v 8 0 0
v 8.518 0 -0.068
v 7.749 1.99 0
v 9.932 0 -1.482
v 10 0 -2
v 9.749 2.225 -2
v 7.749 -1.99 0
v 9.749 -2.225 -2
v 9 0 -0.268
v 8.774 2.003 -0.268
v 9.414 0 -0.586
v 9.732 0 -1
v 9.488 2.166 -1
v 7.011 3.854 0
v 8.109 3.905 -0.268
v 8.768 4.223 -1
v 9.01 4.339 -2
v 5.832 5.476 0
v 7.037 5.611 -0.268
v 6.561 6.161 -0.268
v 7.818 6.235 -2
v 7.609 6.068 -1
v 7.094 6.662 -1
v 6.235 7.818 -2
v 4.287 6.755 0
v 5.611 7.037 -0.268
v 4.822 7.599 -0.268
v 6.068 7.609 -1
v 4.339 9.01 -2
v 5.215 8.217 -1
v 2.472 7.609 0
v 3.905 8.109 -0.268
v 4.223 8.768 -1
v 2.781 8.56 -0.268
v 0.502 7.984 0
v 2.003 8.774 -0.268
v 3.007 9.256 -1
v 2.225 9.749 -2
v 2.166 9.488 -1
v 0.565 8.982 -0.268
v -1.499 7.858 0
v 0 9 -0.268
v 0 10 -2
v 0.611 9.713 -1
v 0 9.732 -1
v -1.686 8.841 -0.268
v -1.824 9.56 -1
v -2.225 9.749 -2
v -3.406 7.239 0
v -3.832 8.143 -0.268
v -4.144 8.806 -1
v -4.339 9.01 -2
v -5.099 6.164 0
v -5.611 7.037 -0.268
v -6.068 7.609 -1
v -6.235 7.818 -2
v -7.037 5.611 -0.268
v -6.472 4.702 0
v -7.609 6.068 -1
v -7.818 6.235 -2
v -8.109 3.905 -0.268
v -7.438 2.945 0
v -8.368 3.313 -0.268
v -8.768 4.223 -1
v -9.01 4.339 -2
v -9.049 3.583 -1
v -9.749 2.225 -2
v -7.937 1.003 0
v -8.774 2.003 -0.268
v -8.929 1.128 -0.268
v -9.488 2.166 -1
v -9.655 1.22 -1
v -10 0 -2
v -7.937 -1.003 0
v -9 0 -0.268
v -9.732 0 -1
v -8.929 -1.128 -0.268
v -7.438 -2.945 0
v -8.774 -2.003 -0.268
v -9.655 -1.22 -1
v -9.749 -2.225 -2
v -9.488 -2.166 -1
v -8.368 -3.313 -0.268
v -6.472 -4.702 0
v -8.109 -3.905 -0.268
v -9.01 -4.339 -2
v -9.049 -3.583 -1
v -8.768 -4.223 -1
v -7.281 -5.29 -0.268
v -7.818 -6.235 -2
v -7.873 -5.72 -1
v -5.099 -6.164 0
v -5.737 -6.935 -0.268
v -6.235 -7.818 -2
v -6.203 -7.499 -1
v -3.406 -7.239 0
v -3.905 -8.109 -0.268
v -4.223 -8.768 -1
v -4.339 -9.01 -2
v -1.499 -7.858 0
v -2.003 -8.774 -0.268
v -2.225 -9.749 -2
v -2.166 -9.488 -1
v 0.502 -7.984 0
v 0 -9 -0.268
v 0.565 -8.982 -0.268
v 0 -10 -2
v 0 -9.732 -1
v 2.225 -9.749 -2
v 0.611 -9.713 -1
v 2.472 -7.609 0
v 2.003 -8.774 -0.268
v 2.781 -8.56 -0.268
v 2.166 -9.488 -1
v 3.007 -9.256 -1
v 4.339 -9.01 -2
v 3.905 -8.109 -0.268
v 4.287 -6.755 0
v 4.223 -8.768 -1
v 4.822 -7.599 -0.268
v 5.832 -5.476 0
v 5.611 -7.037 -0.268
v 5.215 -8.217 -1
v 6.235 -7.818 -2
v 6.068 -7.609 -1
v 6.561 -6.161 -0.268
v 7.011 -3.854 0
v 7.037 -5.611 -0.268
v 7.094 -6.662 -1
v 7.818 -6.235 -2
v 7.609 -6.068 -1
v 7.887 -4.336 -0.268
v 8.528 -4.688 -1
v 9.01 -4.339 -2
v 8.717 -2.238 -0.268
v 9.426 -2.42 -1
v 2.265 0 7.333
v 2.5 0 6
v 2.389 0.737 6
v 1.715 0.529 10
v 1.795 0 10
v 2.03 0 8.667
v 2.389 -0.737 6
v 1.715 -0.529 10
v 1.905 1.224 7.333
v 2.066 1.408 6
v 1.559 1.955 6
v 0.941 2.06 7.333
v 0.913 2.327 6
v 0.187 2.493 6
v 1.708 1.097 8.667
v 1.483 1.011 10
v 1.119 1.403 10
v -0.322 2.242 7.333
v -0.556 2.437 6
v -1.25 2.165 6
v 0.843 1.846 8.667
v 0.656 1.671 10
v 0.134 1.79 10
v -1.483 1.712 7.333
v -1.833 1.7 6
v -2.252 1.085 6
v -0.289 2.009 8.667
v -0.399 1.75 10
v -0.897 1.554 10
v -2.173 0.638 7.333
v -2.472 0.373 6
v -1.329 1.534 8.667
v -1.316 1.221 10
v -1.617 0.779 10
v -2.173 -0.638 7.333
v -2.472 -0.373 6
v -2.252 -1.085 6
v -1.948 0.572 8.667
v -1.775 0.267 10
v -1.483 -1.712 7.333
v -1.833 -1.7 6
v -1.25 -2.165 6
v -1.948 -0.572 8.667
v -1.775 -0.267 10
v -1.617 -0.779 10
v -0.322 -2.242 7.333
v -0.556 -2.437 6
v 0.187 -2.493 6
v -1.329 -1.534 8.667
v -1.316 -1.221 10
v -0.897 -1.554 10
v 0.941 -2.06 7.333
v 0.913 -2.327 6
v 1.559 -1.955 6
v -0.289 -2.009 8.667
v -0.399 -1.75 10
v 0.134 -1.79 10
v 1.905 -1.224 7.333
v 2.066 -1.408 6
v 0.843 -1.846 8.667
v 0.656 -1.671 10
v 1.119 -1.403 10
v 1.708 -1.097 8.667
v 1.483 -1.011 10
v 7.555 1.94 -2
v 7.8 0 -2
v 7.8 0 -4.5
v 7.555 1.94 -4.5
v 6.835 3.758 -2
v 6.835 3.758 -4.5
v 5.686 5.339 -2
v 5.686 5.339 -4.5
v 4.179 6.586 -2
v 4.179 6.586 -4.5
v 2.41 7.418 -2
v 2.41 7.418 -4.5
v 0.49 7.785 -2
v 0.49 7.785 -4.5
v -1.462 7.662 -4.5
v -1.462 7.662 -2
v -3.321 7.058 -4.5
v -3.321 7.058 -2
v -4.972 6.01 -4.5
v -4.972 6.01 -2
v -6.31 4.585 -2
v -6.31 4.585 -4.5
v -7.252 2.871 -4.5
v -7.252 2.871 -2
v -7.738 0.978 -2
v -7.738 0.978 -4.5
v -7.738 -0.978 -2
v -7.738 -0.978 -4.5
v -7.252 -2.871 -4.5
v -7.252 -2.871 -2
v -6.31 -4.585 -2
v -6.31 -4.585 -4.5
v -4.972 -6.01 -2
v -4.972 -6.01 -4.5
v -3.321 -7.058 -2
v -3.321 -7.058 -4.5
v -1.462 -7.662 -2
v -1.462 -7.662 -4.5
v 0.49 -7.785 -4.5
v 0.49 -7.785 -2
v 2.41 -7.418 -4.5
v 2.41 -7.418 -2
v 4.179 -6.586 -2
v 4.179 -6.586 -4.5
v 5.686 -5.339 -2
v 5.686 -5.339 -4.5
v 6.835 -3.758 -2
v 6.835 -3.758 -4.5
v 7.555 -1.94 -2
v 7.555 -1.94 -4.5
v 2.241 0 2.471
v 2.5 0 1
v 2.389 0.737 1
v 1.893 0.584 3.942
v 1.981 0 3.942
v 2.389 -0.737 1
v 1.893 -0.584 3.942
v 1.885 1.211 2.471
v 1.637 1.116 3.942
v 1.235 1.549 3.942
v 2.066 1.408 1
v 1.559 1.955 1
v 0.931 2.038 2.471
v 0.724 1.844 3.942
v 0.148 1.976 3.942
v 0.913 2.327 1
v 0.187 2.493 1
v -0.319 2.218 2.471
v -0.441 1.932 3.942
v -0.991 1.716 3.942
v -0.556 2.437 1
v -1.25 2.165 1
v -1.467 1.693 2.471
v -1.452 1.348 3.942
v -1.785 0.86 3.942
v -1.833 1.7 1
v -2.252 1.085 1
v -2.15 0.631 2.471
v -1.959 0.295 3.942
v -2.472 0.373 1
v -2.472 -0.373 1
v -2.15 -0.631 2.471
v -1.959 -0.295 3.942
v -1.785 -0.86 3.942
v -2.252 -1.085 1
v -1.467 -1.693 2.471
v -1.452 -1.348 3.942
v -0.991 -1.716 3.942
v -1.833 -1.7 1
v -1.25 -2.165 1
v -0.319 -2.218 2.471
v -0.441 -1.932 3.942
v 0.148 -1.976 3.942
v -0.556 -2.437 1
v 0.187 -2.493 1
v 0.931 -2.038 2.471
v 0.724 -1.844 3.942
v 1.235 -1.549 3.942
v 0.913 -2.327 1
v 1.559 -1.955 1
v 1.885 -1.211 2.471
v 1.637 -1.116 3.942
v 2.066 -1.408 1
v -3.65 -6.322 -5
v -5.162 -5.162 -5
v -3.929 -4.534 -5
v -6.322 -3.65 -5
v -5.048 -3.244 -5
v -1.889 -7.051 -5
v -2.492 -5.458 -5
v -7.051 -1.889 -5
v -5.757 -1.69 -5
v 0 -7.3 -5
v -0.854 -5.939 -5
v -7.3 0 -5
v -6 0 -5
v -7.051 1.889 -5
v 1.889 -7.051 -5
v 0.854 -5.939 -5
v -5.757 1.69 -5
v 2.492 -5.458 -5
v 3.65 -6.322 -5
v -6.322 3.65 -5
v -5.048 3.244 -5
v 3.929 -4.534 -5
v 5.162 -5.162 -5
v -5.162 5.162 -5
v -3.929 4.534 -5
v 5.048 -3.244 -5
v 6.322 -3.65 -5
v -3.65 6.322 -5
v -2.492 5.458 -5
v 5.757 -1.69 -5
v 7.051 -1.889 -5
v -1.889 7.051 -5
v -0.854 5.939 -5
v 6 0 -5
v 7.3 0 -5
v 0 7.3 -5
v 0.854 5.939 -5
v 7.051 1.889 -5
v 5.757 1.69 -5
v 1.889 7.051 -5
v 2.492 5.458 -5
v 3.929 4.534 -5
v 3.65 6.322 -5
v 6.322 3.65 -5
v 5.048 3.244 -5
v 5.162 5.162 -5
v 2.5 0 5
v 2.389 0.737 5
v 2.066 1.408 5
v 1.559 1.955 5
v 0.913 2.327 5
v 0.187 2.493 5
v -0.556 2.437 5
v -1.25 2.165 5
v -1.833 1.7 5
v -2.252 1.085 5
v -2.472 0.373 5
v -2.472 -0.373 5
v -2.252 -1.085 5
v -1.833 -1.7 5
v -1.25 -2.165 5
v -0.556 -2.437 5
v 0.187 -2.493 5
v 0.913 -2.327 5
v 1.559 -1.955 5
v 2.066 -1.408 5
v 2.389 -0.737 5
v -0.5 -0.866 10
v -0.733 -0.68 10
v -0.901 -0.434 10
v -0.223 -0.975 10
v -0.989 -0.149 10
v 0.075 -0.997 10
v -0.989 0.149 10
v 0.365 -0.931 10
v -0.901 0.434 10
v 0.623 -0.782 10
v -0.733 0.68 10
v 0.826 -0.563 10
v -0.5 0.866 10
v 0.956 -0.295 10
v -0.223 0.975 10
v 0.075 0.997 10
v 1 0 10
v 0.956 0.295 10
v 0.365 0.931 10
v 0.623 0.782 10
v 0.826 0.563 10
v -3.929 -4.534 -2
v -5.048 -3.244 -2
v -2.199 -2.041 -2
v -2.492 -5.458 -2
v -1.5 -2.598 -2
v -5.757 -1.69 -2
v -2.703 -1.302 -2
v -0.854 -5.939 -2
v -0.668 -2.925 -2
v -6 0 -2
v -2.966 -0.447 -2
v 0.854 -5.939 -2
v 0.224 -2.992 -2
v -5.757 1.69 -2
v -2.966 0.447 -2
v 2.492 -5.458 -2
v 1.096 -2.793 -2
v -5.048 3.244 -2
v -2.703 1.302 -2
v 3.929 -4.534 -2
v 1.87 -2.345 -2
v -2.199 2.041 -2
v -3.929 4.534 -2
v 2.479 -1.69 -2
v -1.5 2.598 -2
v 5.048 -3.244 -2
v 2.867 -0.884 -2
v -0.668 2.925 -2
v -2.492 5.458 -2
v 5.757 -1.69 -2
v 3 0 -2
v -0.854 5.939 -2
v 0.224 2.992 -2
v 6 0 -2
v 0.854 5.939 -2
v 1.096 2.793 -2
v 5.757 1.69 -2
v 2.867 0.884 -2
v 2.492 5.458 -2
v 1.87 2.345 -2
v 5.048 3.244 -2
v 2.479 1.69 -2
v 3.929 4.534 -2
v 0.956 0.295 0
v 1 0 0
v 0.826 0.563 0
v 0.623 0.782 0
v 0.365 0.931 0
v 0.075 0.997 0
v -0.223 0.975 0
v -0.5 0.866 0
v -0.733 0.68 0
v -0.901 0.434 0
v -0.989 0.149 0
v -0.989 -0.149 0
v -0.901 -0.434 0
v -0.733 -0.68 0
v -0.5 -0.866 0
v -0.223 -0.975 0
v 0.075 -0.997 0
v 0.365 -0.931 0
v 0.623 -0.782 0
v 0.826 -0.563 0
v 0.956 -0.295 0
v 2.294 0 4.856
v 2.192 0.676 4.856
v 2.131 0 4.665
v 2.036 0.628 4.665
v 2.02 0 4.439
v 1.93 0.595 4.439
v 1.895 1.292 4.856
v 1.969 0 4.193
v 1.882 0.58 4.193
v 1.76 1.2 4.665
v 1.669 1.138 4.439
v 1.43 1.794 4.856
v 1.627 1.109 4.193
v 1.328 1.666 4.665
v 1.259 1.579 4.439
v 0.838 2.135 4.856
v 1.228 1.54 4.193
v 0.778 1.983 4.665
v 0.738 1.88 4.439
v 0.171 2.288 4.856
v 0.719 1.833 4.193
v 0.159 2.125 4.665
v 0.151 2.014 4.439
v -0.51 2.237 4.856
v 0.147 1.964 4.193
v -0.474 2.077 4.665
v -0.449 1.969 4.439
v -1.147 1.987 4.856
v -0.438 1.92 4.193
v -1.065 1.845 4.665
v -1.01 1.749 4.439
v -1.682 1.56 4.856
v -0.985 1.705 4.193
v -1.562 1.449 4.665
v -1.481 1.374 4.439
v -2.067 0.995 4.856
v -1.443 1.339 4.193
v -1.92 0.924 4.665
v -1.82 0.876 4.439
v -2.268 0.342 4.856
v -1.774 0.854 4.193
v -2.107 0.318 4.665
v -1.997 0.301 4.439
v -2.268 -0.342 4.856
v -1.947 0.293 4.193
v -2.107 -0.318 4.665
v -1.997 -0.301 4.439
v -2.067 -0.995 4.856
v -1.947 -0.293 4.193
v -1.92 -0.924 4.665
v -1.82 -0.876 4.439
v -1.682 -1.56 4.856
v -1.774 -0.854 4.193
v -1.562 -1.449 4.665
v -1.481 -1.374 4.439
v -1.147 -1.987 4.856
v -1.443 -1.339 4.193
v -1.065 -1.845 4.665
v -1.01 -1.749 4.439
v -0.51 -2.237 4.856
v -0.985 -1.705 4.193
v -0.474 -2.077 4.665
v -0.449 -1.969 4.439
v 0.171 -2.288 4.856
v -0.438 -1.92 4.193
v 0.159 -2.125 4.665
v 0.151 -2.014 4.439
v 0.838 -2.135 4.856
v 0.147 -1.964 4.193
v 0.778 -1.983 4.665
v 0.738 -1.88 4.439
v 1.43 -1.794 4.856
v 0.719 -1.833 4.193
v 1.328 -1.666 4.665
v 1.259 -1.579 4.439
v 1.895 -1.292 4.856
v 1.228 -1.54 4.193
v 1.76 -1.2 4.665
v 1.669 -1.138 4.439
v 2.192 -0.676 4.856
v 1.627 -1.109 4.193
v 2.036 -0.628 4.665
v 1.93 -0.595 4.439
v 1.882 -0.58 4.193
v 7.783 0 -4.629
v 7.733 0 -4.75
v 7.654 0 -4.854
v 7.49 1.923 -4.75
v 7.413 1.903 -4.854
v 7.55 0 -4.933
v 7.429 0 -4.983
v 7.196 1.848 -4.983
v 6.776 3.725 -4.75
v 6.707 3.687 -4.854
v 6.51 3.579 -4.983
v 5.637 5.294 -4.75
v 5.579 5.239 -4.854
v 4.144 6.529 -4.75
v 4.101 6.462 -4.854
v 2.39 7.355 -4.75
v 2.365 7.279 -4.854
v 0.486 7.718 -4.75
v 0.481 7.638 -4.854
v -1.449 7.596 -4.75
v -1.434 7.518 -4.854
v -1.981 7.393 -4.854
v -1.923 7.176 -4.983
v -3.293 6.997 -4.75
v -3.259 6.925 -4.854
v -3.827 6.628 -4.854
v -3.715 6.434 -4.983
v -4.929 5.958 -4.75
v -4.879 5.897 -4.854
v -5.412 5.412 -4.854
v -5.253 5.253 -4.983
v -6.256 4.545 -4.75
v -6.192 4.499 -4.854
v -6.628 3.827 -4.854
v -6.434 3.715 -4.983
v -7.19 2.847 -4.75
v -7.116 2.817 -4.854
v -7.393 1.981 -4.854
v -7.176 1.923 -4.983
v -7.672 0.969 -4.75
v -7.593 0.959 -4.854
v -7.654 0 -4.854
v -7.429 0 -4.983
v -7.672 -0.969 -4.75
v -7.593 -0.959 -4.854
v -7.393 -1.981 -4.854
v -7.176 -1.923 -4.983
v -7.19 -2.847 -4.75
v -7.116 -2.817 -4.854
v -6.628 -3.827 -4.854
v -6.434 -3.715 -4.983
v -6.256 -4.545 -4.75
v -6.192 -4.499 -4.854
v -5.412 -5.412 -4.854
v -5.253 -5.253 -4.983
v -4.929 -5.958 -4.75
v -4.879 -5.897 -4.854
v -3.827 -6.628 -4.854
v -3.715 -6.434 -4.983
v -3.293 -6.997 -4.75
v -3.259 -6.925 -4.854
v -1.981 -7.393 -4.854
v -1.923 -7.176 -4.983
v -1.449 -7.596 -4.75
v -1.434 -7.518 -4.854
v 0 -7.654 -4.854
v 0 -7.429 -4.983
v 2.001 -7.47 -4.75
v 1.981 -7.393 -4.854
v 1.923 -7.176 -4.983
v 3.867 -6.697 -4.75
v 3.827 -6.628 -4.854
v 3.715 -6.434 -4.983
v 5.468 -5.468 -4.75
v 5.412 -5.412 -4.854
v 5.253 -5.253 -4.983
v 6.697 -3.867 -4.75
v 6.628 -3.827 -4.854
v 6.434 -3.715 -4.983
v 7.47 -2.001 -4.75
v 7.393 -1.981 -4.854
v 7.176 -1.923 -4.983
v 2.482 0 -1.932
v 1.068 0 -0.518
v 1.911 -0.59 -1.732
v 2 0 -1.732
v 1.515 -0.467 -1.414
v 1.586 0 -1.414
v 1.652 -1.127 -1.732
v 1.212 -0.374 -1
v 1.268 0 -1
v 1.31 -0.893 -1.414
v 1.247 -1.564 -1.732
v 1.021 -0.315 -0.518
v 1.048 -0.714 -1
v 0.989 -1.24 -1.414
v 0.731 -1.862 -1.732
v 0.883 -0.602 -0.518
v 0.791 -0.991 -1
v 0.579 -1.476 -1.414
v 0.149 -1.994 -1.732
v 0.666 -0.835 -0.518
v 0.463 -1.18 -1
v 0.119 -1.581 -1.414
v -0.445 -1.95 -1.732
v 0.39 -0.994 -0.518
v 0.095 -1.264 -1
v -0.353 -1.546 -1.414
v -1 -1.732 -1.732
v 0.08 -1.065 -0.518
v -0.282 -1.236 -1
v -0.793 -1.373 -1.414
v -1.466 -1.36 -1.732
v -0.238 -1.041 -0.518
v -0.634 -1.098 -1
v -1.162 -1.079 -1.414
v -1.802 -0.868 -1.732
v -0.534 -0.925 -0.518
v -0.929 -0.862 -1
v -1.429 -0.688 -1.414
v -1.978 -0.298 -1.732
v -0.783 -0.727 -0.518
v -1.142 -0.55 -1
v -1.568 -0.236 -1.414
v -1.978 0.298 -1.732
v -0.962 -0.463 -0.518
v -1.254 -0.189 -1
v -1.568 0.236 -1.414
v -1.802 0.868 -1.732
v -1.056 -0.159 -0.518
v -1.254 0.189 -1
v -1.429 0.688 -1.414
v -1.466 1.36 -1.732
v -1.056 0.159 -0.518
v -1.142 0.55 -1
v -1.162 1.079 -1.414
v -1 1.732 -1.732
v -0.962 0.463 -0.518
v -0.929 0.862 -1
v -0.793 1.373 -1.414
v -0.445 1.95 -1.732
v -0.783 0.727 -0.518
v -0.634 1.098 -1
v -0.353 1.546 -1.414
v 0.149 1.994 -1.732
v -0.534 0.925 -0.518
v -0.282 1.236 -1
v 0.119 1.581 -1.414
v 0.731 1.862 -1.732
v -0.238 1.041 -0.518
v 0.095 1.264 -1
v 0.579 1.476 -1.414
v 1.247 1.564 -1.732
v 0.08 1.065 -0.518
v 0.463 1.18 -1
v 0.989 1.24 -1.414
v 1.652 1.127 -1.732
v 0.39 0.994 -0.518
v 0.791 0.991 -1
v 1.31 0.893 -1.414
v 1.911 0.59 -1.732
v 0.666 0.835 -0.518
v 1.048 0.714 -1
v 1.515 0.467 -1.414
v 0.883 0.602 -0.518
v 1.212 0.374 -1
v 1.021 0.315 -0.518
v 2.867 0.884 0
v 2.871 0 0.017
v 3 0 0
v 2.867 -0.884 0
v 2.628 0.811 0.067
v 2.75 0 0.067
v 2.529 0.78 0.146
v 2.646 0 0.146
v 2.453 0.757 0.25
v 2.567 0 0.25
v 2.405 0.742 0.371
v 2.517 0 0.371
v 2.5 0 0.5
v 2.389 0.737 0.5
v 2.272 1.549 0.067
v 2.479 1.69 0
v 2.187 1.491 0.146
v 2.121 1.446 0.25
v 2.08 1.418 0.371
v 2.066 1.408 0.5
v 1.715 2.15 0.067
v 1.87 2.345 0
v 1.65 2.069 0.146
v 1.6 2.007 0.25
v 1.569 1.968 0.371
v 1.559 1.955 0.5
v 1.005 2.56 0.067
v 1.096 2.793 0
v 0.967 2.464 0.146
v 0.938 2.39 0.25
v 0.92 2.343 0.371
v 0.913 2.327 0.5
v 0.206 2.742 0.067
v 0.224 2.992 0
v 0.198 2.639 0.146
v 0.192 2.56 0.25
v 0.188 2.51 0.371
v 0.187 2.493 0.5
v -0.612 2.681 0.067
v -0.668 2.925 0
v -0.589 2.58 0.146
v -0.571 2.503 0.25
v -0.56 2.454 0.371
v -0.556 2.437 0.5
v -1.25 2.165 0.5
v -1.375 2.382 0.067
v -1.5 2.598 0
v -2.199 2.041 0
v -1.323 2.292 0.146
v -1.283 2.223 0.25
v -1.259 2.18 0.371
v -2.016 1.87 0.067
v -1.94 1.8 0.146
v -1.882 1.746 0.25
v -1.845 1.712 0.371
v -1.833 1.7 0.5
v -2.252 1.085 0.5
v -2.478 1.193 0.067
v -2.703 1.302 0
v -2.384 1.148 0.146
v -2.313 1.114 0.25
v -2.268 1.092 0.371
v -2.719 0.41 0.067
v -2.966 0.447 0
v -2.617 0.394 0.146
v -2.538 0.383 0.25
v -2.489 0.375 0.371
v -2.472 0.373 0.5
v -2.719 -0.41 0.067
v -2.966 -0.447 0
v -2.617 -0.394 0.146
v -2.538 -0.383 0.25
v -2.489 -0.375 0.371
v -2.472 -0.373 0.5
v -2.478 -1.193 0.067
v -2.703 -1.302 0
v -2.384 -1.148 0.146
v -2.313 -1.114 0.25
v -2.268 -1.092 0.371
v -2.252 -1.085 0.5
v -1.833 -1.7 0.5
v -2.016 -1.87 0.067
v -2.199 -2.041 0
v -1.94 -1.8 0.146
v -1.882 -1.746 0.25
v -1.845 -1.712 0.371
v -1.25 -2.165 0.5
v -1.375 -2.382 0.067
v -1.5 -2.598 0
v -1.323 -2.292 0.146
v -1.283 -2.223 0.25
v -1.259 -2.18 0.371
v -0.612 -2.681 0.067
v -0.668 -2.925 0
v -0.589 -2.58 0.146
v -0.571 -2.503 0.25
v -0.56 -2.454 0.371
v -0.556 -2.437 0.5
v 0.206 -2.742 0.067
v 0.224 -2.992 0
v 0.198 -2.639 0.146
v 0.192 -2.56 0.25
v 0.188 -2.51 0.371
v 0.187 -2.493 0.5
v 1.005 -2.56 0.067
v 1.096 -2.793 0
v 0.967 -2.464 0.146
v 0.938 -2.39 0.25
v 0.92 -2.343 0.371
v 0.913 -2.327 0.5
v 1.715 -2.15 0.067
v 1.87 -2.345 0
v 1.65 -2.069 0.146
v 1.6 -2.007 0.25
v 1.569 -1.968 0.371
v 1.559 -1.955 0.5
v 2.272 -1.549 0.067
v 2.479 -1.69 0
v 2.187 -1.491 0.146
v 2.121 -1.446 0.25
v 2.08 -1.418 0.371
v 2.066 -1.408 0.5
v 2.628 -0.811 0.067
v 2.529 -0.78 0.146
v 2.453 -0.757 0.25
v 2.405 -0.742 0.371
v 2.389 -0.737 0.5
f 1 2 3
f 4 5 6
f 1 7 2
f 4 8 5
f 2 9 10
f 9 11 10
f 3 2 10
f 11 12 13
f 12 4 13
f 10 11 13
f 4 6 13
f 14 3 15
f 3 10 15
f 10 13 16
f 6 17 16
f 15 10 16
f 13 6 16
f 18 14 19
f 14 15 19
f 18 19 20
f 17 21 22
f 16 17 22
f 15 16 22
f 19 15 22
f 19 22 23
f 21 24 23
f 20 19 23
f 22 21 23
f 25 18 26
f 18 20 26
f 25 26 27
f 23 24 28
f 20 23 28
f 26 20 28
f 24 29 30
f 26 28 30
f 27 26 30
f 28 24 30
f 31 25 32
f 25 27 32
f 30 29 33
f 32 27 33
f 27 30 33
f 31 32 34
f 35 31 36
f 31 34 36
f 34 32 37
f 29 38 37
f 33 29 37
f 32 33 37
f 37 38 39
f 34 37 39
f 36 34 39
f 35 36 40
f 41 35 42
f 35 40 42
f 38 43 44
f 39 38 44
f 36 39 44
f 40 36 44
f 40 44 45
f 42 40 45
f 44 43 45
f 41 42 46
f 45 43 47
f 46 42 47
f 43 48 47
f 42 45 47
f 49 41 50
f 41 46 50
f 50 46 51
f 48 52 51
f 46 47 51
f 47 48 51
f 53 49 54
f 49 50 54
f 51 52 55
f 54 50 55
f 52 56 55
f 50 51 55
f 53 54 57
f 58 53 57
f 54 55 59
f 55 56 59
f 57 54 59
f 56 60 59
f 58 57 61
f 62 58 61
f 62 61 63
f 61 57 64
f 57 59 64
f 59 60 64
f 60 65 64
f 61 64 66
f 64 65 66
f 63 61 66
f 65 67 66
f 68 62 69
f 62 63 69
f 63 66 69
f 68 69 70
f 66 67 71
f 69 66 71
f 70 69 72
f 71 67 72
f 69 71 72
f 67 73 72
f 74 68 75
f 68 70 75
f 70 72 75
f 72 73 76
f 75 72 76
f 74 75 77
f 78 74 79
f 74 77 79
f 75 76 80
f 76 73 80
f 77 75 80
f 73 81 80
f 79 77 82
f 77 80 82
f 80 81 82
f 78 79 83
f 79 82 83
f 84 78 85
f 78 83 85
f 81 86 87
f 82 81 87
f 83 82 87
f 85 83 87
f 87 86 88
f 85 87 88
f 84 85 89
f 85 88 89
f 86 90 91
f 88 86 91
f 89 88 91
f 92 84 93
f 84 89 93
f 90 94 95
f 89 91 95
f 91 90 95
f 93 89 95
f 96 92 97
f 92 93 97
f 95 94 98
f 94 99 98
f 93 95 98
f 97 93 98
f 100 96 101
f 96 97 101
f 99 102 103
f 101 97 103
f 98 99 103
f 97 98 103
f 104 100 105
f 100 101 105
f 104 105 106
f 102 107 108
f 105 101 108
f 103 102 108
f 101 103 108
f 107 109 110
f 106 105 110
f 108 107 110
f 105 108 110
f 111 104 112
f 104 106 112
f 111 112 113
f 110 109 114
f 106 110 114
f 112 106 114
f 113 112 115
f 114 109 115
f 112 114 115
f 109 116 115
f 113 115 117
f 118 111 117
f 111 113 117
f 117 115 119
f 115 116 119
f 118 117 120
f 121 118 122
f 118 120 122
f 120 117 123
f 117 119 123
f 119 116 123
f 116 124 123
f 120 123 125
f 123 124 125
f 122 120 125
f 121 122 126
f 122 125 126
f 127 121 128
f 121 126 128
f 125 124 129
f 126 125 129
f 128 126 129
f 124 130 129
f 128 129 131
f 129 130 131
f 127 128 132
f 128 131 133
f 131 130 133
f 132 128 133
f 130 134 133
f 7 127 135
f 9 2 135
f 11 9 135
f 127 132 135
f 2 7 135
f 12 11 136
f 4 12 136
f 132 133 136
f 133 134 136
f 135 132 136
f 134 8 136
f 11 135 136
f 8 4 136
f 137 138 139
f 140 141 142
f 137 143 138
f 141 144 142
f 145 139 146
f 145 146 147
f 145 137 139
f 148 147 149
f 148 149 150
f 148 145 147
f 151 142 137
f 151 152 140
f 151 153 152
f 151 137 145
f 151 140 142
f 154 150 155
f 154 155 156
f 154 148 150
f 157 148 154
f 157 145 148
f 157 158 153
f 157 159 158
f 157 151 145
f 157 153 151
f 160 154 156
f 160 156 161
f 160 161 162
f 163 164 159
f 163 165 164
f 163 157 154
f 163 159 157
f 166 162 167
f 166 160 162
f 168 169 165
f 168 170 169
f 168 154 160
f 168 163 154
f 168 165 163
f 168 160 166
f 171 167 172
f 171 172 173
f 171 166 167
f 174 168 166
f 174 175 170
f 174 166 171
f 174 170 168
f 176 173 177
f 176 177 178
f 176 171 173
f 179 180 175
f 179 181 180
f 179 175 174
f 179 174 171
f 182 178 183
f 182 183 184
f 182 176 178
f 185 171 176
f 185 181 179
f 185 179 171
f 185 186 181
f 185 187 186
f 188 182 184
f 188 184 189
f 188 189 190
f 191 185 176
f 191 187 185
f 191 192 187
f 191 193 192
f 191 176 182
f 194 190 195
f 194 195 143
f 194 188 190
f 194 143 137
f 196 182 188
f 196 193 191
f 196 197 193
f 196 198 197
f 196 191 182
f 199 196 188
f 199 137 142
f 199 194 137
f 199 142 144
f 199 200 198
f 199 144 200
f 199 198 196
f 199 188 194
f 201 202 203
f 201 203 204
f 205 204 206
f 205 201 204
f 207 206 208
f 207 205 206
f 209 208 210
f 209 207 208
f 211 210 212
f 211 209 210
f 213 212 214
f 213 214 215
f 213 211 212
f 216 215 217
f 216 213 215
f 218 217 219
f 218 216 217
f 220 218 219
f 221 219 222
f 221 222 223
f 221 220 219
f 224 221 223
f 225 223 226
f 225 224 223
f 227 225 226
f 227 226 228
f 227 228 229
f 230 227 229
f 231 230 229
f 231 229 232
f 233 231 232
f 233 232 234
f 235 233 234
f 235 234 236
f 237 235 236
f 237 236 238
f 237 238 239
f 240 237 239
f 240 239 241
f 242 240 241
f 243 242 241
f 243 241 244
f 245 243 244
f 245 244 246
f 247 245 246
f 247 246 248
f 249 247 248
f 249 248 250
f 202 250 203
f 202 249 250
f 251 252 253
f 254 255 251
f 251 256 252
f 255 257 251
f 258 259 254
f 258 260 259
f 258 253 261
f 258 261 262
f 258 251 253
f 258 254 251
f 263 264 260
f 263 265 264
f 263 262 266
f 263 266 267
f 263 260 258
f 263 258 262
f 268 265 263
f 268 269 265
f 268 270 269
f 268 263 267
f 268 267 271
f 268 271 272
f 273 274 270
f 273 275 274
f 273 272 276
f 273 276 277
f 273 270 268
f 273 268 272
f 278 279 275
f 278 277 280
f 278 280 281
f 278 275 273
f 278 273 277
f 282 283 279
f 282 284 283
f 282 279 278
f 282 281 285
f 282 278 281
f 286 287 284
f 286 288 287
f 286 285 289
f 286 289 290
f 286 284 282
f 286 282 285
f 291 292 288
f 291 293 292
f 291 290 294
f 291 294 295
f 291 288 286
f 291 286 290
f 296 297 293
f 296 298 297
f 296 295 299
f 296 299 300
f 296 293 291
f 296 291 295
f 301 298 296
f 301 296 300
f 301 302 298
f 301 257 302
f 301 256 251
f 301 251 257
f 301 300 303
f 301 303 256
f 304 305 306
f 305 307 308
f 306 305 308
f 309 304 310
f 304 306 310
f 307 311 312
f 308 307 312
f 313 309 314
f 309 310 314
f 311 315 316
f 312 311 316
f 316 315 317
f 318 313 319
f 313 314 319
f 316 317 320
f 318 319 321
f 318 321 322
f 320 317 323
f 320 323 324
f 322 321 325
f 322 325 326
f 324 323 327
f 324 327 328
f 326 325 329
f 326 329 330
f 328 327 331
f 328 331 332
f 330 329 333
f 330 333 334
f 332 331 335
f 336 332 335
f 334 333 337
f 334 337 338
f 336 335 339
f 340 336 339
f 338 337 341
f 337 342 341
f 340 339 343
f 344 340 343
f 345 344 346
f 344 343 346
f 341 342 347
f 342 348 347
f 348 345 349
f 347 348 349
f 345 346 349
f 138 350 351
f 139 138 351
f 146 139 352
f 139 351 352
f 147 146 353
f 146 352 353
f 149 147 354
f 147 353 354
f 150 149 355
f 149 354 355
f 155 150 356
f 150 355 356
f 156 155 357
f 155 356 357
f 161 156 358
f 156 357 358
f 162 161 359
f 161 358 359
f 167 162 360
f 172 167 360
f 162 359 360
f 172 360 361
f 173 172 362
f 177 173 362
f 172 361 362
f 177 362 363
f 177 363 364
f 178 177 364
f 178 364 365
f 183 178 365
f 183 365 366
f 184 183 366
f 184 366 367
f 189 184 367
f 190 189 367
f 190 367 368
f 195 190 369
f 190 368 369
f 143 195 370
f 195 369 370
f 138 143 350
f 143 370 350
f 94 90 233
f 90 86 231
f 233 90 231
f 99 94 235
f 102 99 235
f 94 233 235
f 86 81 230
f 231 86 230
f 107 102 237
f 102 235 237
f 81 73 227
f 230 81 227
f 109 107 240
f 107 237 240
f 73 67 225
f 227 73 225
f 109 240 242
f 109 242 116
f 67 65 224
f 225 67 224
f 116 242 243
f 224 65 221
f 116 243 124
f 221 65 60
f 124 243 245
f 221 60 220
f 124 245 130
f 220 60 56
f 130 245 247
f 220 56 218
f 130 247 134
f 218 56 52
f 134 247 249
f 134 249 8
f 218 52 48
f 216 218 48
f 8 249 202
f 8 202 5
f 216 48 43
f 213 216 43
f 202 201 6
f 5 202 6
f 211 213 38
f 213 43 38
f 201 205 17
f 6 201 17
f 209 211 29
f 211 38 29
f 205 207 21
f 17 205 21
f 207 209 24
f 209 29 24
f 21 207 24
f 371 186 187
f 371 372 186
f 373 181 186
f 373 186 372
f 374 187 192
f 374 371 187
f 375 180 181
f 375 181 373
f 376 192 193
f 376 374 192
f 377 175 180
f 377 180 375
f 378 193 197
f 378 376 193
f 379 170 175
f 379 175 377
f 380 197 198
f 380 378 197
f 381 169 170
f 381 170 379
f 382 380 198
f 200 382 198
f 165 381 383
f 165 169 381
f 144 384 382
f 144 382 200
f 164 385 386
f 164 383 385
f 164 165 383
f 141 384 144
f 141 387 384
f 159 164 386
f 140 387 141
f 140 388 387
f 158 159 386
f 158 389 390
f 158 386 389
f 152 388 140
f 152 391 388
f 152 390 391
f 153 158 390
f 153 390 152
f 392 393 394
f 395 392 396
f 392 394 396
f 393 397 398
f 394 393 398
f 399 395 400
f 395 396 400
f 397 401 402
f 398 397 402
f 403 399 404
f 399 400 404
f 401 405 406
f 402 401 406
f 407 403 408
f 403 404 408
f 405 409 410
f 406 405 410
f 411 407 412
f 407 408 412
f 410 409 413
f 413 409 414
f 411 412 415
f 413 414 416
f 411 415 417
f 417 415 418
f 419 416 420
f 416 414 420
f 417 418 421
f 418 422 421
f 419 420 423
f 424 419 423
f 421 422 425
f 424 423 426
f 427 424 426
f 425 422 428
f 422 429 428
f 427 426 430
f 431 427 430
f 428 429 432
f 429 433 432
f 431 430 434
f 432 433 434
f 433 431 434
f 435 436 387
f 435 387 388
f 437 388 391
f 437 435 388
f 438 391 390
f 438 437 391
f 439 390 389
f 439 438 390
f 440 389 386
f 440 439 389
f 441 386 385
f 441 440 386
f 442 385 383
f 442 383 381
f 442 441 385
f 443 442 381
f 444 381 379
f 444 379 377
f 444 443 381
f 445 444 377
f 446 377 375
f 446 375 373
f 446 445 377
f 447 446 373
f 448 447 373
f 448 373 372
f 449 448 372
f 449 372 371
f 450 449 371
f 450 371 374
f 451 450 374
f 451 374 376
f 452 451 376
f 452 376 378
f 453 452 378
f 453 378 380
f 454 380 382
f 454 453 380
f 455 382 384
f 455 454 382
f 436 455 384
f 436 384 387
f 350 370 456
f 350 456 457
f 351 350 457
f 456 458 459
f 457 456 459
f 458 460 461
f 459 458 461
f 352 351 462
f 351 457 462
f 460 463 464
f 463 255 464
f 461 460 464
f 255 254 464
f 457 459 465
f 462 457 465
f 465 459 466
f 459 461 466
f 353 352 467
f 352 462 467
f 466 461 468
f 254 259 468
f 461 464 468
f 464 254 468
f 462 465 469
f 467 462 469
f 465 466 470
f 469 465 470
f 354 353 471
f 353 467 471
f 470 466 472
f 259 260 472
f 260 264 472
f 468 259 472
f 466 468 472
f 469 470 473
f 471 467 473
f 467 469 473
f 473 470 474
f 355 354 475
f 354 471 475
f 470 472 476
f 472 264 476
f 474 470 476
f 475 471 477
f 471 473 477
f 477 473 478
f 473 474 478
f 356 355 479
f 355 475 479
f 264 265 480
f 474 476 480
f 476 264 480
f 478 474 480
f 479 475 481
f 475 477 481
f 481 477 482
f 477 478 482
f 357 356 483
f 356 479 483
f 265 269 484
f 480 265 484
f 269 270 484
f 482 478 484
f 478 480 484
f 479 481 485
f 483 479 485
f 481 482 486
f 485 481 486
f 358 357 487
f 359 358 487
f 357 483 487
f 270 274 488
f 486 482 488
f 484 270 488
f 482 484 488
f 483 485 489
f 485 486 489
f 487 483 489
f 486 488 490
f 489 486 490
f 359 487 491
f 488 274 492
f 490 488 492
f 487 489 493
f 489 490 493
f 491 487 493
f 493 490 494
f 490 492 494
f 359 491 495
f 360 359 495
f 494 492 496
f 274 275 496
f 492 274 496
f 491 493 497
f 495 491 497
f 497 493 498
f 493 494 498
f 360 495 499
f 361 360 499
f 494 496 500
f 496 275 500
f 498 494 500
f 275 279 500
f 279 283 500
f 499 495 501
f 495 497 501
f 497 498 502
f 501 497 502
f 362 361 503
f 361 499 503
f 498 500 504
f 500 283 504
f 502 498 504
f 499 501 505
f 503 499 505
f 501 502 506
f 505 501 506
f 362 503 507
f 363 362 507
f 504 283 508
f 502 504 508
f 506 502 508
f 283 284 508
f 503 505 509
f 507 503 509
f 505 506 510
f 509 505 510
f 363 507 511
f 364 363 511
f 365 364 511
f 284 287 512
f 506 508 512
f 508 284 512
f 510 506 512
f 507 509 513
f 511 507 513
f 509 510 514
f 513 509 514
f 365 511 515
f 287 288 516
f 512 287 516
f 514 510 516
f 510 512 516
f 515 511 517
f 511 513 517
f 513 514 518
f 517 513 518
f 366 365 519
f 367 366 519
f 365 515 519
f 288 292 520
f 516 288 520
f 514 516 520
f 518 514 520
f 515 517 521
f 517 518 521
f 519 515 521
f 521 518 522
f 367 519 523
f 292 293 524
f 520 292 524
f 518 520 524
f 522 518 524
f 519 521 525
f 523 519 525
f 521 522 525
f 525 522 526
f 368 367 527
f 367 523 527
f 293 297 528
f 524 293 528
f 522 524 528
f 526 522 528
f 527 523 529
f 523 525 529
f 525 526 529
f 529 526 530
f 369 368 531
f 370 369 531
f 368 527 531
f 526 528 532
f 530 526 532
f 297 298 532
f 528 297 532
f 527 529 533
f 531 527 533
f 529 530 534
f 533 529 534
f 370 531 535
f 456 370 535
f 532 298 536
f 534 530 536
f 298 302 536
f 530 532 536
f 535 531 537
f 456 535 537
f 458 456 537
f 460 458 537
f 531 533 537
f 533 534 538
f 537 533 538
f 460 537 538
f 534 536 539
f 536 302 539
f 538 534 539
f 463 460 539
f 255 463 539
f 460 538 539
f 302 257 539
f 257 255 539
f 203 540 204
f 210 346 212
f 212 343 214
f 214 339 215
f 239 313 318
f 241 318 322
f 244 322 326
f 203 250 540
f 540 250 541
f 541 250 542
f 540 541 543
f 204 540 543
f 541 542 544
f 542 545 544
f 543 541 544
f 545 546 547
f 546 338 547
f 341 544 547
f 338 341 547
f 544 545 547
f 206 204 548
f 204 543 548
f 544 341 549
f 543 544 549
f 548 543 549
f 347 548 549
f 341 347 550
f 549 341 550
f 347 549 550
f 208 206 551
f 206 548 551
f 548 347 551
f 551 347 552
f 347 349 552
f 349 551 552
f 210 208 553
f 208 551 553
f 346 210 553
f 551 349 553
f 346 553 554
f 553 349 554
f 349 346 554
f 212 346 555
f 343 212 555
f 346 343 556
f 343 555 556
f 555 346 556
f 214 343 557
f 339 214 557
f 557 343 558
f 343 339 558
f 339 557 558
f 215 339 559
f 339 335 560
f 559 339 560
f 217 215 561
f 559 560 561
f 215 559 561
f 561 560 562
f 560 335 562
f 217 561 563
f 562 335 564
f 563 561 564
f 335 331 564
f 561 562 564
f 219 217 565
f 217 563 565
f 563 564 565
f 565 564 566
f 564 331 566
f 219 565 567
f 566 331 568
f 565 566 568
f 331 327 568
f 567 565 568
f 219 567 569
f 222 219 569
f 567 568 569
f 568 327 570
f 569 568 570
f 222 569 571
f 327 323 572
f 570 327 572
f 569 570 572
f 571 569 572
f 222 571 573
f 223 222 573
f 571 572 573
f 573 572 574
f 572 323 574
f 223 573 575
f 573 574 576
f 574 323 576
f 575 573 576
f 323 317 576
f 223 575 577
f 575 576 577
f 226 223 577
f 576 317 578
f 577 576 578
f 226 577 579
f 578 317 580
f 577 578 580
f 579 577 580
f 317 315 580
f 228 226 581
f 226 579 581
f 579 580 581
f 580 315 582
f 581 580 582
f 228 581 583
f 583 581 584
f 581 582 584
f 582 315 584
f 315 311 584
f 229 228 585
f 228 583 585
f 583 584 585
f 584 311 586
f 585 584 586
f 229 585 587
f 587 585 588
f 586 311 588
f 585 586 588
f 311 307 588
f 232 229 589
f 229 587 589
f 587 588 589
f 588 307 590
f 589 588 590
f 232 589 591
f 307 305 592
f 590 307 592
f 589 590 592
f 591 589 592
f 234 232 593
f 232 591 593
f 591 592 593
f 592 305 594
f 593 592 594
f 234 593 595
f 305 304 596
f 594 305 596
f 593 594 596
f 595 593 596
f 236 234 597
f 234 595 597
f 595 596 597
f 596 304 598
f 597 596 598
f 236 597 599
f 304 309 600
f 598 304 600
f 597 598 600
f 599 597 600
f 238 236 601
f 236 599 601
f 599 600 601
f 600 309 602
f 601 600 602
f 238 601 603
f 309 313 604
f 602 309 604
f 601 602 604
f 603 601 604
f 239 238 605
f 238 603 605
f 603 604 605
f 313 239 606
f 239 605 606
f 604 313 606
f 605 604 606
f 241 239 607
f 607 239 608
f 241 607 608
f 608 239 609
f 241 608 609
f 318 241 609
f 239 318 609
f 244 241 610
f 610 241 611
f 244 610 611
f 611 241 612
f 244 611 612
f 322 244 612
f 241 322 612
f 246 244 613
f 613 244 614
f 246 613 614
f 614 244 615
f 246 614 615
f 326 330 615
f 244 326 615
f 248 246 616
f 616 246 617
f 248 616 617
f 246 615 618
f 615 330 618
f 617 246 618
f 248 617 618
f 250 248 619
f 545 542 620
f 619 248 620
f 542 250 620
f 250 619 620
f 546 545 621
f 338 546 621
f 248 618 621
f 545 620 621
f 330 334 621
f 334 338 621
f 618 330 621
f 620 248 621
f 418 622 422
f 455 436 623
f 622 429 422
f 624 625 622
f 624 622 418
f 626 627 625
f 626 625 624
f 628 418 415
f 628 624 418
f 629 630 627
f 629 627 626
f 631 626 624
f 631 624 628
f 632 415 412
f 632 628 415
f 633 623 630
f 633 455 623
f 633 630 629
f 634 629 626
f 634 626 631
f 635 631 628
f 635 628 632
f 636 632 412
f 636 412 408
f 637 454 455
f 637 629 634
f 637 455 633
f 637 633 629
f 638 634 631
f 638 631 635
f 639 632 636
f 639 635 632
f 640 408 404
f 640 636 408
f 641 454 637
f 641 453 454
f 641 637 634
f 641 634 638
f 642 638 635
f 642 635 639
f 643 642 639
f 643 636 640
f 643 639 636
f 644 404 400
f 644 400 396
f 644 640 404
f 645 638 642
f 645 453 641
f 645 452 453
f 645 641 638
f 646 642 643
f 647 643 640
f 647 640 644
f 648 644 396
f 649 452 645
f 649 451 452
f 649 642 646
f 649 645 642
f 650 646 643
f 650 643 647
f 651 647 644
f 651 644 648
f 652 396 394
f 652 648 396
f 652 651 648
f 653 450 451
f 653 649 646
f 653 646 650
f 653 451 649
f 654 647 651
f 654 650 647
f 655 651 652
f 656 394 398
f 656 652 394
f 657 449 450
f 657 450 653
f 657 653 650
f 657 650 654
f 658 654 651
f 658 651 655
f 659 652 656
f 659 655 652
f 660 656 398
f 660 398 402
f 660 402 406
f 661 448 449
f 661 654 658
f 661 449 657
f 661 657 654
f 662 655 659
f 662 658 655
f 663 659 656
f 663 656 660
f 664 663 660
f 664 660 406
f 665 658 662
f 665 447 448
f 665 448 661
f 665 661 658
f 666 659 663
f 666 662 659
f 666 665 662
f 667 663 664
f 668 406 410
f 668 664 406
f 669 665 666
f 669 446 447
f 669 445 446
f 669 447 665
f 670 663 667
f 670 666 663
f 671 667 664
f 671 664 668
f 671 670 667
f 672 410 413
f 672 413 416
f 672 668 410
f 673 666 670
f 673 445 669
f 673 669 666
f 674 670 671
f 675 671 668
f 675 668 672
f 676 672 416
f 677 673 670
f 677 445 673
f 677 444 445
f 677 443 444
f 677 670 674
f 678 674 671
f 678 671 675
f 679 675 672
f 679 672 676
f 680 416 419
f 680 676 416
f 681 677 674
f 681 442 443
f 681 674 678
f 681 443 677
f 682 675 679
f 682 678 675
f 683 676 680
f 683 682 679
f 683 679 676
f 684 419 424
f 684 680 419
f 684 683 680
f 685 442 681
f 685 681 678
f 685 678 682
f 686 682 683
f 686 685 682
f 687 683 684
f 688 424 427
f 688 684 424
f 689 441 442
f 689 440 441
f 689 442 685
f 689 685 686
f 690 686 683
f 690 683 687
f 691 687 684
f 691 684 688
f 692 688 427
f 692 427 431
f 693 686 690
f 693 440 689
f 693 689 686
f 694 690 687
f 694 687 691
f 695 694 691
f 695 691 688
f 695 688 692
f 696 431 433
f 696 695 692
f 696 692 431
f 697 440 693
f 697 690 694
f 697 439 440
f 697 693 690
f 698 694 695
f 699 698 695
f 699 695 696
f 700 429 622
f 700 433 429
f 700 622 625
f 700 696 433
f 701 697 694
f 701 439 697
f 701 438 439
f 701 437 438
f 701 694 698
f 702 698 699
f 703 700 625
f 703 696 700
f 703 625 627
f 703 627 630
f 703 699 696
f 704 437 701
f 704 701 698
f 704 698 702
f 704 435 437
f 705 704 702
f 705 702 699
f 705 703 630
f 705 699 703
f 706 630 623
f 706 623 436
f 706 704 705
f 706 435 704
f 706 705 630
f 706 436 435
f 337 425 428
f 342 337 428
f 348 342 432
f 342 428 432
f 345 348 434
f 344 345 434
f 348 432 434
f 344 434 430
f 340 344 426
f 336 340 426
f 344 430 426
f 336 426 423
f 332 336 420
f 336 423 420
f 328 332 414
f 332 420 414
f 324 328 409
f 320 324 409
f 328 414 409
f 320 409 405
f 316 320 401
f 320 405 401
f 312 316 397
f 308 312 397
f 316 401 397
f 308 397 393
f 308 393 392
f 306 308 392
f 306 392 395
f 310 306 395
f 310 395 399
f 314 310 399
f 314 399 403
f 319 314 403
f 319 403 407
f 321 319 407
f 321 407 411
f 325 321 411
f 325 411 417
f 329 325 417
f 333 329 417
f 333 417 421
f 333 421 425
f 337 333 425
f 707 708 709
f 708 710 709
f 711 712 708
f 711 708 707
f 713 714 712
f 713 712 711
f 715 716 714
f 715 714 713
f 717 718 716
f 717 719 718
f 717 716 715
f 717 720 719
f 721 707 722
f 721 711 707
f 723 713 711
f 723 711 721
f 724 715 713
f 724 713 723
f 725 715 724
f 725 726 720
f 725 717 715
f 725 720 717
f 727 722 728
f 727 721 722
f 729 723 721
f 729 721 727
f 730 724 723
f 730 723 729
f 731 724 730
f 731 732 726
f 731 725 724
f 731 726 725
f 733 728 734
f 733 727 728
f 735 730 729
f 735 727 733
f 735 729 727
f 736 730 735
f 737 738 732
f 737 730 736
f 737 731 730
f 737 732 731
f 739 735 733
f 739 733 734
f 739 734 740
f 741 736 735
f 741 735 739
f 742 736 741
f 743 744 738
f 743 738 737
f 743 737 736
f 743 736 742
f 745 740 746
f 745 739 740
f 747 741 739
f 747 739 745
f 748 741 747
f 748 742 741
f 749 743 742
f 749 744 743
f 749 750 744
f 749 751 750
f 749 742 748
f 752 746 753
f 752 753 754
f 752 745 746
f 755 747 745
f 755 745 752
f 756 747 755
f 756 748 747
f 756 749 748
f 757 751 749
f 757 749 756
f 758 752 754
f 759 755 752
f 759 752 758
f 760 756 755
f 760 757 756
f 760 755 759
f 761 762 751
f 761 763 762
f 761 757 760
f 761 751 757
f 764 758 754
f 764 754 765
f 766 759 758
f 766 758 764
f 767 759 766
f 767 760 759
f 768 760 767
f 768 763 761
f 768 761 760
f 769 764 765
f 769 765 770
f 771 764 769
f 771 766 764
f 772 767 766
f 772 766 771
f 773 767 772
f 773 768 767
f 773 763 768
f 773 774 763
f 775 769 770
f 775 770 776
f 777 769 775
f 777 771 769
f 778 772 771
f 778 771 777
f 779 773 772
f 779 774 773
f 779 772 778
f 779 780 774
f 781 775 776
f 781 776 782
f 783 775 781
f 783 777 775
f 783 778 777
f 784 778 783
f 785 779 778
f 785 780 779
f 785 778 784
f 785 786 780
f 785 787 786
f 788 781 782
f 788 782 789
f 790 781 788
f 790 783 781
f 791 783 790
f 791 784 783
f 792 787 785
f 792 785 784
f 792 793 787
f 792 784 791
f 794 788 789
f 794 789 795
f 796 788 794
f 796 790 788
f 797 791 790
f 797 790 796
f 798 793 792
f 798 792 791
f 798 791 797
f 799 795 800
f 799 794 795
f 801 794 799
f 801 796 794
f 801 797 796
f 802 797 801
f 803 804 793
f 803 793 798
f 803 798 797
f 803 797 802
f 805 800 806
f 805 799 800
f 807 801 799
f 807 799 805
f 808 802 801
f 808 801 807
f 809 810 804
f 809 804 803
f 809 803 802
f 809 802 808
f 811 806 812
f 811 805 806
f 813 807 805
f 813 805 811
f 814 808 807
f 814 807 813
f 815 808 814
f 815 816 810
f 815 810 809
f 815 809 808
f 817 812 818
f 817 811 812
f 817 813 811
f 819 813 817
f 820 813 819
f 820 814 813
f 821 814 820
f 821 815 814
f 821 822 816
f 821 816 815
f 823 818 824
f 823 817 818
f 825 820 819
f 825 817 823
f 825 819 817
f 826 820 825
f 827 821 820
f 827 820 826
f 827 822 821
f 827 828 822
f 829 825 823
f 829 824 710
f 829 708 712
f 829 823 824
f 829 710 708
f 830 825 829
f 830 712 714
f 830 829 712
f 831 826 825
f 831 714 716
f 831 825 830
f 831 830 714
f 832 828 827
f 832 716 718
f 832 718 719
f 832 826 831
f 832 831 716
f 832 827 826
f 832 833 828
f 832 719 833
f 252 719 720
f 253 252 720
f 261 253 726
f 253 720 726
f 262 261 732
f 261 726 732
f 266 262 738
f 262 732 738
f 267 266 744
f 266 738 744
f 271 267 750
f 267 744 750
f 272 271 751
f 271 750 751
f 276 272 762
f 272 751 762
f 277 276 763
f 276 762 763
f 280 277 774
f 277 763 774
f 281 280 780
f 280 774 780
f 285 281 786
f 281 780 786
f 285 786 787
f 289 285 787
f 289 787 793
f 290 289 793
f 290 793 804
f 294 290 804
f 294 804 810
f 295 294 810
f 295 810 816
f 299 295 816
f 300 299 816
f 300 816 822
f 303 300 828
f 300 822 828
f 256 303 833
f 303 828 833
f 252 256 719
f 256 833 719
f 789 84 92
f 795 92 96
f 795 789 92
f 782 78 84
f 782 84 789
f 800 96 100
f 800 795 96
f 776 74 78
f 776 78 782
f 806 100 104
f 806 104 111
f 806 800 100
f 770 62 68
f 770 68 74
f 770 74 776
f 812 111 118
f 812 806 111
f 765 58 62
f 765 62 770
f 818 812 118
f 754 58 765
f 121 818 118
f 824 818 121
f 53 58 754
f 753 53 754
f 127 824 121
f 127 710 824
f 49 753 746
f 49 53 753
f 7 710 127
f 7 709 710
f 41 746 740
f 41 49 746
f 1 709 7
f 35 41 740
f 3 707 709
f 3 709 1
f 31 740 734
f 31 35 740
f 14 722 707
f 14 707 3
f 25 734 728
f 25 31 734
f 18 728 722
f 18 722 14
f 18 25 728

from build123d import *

# Parameters (mm, degrees)
SKETCH1_R                   = 2.5
SKETCH1_R_2                 = 1
BOSS_EXTRUDE1_DEPTH         = 5
CHAMFER2_SIZE               = 4
CHAMFER2_SIZE2              = 0.705307923
LPATTERN2_COUNT             = 2
LPATTERN2_PITCH             = 5
CHAMFER2_OF_LPATTERN2_SIZE2 = 0.705307923
CHAMFER2_OF_LPATTERN2_SIZE  = 4
FILLET1_R                   = 1
SKETCH2_R                   = 10
BOSS_EXTRUDE2_DEPTH         = 2
CUT_EXTRUDE2_START          = -15
SKETCH4_R                   = 1
CUT_EXTRUDE2_DEPTH          = 15
FILLET3_R                   = 2
SKETCH5_R                   = 7.8
SKETCH5_R_2                 = 6
BOSS_EXTRUDE3_DEPTH         = 5
FILLET4_R                   = 2
FILLET5_R                   = 0.5
FILLET6_R                   = 0.5


# Some blends are built 0.0001 mm under size
with BuildPart() as part:
    # Sketch1 → Boss-Extrude1 (new body)
    with BuildSketch(Plane.XY):
        Circle(SKETCH1_R)
        Circle(SKETCH1_R_2, mode=Mode.SUBTRACT)
    boss_extrude1 = extrude(amount=BOSS_EXTRUDE1_DEPTH)

    # Chamfer2
    chamfer2_edges = [part.edges().sort_by_distance(p)[0] for p in [
        (-2.5, 0, 5),
    ]]
    chamfer2_side = [part.faces().sort_by_distance(p)[0] for p in [
        (-2.5, 0, 2.5),
    ]]
    chamfer(chamfer2_edges, length=CHAMFER2_SIZE, length2=CHAMFER2_SIZE2, reference=chamfer2_side[0])


with BuildPart() as lpattern2_1:
    # LPattern2: Boss-Extrude1 ×2
    with Locations(*[(0, 0, i * LPATTERN2_PITCH) for i in range(1, LPATTERN2_COUNT)]):
        add(boss_extrude1)

    # Chamfer2 of LPattern2
    chamfer2_of_lpattern2_edges = [lpattern2_1.edges().sort_by_distance(p)[0] for p in [
        (-2.5, 0, 10),
    ]]
    chamfer(chamfer2_of_lpattern2_edges, length=CHAMFER2_OF_LPATTERN2_SIZE, length2=CHAMFER2_OF_LPATTERN2_SIZE2)


with BuildPart() as part_1:
    add(part.part)

    # LPattern2 united with what the copies to: union LPattern2_1
    add(lpattern2_1.part)

    # Fillet1
    # the kernel refuses this fillet: 1 mm, written as the material it adds along each edge
    with BuildSketch(Plane(origin=(0, 0, 5), x_dir=(1, 0, 0), z_dir=(0, -1, 0))) as fillet1_piece_1:
        with BuildLine():
            CenterArc((2.96611905, -0.884722008), FILLET1_R, 117.782669079, 72.217330921)
            Line((1.981311297, -1.058370186), (1.961615141, -1.061843149))
            Line((1.961615141, -1.061843149), (1.774995922, -0.003472964))
            Line((1.774995922, -0.003472964), (1.794692077, 0.02))
            ThreePointArc((1.794692077, 0.02), (2.147346039, 0.02), (2.490677619, 0.01769444))
            Line((2.490677619, 0.01769444), (2.5, 0))
        make_face()
    revolve(axis=Axis((0, 0, 5), (0, 0, 1)))

    # Sketch2 → Boss-Extrude2 (add)
    with BuildSketch(Plane.XY):
        Circle(SKETCH2_R)
    extrude(amount=-BOSS_EXTRUDE2_DEPTH)

    # Sketch4 → Cut-Extrude2 (cut)
    with BuildSketch(Plane.XY.offset(CUT_EXTRUDE2_START)):
        Circle(SKETCH4_R)
    extrude(amount=CUT_EXTRUDE2_DEPTH, mode=Mode.SUBTRACT)

    # Fillet3
    fillet3_edges = [part_1.edges().sort_by_distance(p)[0] for p in [
        (-1, 0, -2),
    ]]
    fillet(fillet3_edges, radius=FILLET3_R)

    # Sketch5 → Boss-Extrude3 (add)
    with BuildSketch(Plane.XY):
        Circle(SKETCH5_R)
        Circle(SKETCH5_R_2, mode=Mode.SUBTRACT)
    extrude(amount=-BOSS_EXTRUDE3_DEPTH)

    # Fillet4
    fillet4_edges = [part_1.edges().sort_by_distance(p)[0] for p in [
        (-10, 0, 0),
    ]]
    fillet(fillet4_edges, radius=FILLET4_R - 0.0001)  # a hair under: the kernel refuses the full size

    # Fillet5
    fillet5_edges = [part_1.edges().sort_by_distance(p)[0] for p in [
        (-2.5, 0, 0),
    ]]
    fillet(fillet5_edges, radius=FILLET5_R)

    # Fillet6
    fillet6_edges = [part_1.edges().sort_by_distance(p)[0] for p in [
        (-7.8, 0, -5),
    ]]
    fillet(fillet6_edges, radius=FILLET6_R)


solid = part_1.part
